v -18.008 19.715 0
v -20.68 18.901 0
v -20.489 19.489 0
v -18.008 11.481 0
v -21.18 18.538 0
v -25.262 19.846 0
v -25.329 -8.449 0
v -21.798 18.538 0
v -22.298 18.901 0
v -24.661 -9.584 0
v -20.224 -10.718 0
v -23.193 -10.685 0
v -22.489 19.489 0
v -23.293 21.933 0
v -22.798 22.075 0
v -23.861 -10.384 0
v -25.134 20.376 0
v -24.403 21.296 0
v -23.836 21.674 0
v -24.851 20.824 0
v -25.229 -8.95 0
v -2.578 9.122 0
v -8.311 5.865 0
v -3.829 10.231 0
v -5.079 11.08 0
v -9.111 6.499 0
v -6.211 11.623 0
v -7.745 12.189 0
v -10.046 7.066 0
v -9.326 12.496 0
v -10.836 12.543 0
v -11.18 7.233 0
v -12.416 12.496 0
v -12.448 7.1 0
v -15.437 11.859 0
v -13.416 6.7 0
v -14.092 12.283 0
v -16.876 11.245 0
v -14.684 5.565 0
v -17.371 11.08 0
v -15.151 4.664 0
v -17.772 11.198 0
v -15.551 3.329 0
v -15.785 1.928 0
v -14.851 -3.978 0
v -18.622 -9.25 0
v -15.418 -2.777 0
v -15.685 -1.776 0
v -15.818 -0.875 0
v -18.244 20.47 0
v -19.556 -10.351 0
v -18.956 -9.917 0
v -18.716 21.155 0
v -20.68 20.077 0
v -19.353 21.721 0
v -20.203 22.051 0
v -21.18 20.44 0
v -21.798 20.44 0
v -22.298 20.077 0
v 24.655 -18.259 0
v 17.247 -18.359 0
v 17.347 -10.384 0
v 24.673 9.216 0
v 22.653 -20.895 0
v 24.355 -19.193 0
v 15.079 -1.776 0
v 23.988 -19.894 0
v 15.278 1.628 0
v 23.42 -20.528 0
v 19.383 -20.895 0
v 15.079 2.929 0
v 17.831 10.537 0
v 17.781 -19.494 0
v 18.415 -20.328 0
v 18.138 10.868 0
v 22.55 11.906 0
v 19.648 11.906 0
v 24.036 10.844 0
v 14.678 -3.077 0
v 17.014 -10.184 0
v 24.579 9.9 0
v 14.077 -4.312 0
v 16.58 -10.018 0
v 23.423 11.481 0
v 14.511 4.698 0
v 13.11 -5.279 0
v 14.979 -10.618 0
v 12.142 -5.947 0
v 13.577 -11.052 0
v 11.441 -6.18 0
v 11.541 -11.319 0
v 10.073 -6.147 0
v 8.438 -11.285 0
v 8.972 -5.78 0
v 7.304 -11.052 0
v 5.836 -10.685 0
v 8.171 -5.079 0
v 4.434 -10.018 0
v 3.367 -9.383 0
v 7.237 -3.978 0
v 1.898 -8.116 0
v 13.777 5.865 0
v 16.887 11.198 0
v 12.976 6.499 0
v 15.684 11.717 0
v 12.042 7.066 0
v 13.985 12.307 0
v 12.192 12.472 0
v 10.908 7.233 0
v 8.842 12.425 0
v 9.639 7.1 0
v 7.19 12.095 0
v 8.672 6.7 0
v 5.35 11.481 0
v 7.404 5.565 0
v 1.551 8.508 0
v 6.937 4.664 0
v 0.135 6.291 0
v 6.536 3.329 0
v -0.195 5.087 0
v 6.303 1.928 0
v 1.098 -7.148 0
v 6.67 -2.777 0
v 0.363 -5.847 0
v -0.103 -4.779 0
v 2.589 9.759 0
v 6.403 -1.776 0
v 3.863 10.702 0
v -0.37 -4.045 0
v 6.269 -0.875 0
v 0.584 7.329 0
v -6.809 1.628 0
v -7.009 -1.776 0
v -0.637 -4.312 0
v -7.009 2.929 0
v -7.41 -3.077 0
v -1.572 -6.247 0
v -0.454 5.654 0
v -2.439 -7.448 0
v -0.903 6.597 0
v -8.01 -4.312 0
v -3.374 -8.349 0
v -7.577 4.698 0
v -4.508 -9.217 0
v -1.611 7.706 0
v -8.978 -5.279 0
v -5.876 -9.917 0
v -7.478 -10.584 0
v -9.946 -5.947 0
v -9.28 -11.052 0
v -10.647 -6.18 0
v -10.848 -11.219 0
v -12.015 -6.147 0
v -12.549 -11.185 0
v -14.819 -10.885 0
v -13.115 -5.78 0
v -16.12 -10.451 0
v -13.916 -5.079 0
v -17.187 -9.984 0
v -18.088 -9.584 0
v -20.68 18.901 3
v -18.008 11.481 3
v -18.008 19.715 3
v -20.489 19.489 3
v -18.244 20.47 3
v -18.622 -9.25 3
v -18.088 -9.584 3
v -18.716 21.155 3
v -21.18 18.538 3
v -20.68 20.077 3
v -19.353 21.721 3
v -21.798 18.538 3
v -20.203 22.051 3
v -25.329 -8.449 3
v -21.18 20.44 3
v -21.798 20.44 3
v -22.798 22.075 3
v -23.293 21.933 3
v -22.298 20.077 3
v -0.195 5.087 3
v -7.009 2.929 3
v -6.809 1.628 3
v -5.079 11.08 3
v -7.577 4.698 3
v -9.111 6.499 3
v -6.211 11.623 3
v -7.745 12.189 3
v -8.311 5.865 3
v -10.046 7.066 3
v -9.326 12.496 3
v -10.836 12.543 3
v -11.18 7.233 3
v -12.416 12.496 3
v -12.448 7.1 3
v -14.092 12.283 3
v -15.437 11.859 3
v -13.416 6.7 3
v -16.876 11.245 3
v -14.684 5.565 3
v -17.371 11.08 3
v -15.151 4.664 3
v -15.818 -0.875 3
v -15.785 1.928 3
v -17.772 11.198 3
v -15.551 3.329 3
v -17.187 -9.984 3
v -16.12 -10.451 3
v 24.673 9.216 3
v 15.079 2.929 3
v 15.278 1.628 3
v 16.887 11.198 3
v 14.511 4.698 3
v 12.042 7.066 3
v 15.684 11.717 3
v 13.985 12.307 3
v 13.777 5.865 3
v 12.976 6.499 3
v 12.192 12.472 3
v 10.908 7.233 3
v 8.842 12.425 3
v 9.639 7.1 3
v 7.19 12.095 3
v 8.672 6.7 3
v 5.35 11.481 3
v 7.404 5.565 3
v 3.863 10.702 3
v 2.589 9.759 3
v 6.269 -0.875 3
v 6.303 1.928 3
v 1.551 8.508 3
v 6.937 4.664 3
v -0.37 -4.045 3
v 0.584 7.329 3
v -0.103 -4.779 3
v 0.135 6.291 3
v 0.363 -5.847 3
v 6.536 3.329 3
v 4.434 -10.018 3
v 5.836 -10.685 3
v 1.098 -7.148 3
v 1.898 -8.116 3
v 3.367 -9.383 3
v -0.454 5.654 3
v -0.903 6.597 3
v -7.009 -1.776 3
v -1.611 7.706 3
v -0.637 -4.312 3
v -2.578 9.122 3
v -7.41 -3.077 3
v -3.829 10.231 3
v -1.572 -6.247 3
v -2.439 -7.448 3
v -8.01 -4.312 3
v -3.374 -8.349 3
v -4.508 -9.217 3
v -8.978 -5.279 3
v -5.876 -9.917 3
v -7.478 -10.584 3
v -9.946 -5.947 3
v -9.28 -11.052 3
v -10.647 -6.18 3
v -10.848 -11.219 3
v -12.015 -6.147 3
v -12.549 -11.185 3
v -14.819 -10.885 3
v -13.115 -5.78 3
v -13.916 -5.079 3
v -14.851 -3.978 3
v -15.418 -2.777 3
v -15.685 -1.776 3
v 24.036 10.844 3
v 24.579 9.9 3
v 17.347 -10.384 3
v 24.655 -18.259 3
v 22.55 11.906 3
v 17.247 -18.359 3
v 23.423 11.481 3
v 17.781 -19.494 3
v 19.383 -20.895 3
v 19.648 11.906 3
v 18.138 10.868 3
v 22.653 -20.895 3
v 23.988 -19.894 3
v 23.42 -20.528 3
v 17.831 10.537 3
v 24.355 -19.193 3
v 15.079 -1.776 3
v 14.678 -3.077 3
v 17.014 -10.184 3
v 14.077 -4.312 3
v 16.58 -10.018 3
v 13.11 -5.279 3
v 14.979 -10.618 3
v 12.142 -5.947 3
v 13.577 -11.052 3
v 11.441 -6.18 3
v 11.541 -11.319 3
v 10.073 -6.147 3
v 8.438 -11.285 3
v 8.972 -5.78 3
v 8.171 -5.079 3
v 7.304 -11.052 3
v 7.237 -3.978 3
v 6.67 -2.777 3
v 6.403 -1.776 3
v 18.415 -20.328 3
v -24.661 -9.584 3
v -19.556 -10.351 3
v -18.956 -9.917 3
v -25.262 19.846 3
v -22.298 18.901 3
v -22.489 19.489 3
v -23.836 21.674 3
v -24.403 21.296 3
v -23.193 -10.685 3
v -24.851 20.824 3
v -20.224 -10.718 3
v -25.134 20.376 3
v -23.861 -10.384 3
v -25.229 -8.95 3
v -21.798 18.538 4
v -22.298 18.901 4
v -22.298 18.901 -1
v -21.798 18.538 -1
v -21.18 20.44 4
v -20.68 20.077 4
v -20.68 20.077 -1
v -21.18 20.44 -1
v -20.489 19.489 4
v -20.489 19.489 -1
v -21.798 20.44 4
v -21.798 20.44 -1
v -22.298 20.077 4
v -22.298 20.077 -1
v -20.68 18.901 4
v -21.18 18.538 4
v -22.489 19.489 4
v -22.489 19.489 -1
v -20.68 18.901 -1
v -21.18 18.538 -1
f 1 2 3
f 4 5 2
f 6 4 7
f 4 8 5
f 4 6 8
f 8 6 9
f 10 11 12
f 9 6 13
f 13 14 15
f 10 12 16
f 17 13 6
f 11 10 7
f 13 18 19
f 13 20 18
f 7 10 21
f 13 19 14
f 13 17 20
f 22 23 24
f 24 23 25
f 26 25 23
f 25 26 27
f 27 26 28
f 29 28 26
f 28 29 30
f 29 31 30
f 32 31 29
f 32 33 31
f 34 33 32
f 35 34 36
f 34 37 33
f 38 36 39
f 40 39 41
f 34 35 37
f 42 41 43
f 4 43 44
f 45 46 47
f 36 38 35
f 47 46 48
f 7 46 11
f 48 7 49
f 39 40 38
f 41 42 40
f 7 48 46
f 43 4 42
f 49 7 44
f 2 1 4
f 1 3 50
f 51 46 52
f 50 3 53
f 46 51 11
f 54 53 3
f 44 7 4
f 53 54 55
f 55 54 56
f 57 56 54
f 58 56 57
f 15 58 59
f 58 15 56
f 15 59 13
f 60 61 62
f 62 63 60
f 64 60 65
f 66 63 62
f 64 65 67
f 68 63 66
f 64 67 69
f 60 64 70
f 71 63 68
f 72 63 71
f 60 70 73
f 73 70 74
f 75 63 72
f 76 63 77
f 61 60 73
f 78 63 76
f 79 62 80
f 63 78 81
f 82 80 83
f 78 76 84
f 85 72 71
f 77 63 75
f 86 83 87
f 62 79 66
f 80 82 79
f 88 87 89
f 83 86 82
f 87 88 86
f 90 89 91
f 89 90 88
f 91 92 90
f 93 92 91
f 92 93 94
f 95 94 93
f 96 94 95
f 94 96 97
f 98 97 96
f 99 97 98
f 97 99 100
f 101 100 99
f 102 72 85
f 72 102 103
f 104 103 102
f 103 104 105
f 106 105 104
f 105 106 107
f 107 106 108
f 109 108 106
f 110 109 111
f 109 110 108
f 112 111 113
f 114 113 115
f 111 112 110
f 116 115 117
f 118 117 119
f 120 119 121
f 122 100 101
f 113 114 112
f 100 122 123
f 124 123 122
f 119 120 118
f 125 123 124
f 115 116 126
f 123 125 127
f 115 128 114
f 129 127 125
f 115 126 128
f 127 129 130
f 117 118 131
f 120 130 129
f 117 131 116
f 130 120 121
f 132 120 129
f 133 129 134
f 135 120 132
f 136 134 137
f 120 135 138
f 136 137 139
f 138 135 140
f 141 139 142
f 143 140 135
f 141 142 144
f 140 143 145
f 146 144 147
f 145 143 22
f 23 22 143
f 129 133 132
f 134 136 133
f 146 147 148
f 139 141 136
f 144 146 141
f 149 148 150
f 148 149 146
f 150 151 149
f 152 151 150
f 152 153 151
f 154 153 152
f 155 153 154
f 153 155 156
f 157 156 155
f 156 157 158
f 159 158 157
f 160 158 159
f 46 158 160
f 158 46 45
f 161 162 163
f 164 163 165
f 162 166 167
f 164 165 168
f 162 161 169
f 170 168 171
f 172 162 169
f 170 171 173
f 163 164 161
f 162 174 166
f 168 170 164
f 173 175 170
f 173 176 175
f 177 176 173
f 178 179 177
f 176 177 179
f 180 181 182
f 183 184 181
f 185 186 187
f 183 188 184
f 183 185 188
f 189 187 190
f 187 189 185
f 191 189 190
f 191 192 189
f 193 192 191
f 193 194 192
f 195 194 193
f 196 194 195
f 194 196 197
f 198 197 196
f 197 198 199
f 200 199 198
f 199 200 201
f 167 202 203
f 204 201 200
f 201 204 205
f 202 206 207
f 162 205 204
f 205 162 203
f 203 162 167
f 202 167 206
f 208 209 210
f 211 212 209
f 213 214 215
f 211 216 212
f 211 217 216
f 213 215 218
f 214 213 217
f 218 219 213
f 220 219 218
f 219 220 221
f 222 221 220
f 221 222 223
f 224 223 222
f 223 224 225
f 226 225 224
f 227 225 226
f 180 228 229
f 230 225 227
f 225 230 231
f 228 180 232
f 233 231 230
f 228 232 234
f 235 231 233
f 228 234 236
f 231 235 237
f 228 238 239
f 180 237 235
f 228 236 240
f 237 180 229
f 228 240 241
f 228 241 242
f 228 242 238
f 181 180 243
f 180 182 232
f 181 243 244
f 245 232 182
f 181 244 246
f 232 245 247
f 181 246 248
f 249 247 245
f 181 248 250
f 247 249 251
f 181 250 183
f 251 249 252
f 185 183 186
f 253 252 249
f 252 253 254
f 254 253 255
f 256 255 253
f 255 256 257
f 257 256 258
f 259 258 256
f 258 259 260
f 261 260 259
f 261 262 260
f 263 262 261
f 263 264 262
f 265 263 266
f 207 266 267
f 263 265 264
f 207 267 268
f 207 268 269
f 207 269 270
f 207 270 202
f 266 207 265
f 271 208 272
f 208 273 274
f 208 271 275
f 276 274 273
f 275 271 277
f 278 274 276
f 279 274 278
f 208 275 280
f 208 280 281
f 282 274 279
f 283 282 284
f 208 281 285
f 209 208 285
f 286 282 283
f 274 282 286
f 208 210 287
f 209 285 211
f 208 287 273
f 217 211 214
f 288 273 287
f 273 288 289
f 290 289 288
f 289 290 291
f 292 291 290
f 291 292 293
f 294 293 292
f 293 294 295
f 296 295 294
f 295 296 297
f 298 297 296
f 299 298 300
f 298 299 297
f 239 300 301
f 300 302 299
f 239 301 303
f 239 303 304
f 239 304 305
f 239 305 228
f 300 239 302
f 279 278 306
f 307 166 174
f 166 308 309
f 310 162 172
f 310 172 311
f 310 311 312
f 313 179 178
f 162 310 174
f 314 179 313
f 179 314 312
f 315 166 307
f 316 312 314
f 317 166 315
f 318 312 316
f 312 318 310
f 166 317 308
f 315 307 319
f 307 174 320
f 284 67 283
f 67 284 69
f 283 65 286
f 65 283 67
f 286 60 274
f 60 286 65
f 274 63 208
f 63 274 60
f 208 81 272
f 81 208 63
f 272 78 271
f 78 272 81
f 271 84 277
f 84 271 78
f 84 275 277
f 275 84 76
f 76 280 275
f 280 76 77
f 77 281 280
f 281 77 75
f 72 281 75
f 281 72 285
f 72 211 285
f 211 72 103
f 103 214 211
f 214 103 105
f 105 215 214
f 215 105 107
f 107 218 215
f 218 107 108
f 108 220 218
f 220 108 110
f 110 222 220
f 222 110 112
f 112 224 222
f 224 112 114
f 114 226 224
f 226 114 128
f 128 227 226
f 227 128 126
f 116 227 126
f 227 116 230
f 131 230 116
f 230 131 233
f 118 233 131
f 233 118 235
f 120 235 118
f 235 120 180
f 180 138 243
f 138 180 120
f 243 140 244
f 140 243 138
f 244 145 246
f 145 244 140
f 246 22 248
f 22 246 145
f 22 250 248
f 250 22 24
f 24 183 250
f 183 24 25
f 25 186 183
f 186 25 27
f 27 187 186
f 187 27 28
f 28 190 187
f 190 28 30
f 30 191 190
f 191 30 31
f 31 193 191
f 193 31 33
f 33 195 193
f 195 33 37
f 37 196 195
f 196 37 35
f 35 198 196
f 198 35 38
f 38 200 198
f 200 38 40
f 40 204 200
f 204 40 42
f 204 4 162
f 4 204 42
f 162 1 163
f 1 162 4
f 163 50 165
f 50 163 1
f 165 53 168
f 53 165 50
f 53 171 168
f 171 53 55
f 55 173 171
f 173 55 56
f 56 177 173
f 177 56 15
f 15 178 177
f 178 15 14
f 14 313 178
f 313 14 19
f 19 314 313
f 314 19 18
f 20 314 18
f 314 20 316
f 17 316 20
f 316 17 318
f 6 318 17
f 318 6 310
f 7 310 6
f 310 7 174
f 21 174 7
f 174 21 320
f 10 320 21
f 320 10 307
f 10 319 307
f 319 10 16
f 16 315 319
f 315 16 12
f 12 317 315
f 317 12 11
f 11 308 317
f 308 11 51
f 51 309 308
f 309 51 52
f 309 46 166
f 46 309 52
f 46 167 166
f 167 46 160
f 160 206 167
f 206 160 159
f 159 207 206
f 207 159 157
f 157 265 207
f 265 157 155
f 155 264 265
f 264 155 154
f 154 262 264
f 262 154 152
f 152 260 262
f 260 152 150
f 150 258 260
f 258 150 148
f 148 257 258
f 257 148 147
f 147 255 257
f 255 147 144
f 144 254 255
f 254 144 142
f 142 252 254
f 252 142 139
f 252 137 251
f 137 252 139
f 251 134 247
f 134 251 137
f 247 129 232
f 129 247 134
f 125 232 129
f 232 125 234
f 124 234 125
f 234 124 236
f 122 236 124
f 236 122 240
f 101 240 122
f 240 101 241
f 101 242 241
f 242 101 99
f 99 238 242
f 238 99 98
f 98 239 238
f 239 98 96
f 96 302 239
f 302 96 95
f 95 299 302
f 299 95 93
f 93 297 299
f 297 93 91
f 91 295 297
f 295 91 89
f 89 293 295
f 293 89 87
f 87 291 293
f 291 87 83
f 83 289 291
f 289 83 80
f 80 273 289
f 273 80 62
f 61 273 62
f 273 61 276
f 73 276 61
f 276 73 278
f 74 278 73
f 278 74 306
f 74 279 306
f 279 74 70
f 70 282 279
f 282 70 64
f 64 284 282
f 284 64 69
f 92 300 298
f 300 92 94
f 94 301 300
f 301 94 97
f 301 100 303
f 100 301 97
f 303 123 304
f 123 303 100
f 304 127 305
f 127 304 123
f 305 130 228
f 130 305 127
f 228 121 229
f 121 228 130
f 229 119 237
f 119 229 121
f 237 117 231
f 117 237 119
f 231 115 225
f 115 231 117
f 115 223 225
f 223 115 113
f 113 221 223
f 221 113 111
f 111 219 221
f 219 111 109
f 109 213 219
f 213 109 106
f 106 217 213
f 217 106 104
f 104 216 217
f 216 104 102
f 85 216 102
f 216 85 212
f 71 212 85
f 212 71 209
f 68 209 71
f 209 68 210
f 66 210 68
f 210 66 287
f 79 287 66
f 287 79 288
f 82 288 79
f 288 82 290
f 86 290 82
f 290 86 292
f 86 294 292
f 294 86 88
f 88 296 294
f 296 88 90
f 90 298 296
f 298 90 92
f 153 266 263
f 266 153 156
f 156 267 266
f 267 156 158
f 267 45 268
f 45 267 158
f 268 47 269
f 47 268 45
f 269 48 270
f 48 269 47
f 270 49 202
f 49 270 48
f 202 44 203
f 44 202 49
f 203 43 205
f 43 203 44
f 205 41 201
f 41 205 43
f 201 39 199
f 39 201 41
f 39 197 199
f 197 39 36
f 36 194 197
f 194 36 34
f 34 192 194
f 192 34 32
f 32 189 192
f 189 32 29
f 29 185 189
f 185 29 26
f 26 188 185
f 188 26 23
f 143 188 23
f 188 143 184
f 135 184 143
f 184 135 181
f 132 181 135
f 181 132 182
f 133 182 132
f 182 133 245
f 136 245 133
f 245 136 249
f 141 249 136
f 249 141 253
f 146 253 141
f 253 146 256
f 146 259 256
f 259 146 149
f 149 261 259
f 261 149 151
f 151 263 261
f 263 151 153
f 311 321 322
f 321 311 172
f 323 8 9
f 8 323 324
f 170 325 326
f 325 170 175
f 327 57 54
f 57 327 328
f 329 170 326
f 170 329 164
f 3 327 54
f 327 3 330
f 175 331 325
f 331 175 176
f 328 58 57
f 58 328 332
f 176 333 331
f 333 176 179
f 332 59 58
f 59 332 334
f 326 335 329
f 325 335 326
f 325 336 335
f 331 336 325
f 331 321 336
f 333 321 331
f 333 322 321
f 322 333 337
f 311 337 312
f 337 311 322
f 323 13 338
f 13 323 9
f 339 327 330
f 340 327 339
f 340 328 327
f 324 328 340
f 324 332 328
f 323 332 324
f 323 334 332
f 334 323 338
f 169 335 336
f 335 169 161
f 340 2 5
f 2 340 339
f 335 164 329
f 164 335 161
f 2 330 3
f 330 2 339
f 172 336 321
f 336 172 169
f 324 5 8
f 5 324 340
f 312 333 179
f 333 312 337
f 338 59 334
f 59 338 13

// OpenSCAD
X = 0;
Y = 1;
Z = 2;


//-- Size of the logo in the dxf file
size_ini = [106.8, 91.8];

//-- Original width of the b and q lines
width = 15;

module bq_logo(lx = 50, h = 3)
{
  s = lx / size_ini[X];

  linear_extrude(height=h)
    scale([s, s, 1])
    import("bq-logo2d.dxf", layer="lines");
}

//-- Parameters:
//-- lx = Logo length in the x axis
//-- h = logo height (z axis)
//-- d = Drill diameter
//-  dt = Distance from the drill to the top part
module bq_keychain(lx = 50, h = 3, d = 2, dt = 2)
{
  drill_h = h + 2;
  
  s = lx / size_ini[X];

  bq_logo(lx = lx, h = h);
  
  color("red")
  translate([-lx/2 + s*width/2, s * size_ini[Y]/2 + 1 -d/2 - dt, h/2])
    cylinder(r = d/2, h = drill_h, $fn = 10, center = true);
}


//-- Logo con minkowski inverso aplicado, de manera que
//-- al aplicar minkowski con una esfera de r = 1 se
//-- obtenga el logo original, pero redondeado
module bq_min(h = 5)
{
  linear_extrude(height=h)
    import("bq-logo2d-minkowski.dxf", layer="final");
}

bq_keychain();

//bq_logo_orig();

//-- Logo estándar (5cm de ancho)
*color("blue")
  bq_min();

//-- Logo grande con minkowski
*minkowski() {
  //mirror([0,1,0])
    bq_min(h = 5);
    
  sphere(r=1, center = true, $fn=20);
}
